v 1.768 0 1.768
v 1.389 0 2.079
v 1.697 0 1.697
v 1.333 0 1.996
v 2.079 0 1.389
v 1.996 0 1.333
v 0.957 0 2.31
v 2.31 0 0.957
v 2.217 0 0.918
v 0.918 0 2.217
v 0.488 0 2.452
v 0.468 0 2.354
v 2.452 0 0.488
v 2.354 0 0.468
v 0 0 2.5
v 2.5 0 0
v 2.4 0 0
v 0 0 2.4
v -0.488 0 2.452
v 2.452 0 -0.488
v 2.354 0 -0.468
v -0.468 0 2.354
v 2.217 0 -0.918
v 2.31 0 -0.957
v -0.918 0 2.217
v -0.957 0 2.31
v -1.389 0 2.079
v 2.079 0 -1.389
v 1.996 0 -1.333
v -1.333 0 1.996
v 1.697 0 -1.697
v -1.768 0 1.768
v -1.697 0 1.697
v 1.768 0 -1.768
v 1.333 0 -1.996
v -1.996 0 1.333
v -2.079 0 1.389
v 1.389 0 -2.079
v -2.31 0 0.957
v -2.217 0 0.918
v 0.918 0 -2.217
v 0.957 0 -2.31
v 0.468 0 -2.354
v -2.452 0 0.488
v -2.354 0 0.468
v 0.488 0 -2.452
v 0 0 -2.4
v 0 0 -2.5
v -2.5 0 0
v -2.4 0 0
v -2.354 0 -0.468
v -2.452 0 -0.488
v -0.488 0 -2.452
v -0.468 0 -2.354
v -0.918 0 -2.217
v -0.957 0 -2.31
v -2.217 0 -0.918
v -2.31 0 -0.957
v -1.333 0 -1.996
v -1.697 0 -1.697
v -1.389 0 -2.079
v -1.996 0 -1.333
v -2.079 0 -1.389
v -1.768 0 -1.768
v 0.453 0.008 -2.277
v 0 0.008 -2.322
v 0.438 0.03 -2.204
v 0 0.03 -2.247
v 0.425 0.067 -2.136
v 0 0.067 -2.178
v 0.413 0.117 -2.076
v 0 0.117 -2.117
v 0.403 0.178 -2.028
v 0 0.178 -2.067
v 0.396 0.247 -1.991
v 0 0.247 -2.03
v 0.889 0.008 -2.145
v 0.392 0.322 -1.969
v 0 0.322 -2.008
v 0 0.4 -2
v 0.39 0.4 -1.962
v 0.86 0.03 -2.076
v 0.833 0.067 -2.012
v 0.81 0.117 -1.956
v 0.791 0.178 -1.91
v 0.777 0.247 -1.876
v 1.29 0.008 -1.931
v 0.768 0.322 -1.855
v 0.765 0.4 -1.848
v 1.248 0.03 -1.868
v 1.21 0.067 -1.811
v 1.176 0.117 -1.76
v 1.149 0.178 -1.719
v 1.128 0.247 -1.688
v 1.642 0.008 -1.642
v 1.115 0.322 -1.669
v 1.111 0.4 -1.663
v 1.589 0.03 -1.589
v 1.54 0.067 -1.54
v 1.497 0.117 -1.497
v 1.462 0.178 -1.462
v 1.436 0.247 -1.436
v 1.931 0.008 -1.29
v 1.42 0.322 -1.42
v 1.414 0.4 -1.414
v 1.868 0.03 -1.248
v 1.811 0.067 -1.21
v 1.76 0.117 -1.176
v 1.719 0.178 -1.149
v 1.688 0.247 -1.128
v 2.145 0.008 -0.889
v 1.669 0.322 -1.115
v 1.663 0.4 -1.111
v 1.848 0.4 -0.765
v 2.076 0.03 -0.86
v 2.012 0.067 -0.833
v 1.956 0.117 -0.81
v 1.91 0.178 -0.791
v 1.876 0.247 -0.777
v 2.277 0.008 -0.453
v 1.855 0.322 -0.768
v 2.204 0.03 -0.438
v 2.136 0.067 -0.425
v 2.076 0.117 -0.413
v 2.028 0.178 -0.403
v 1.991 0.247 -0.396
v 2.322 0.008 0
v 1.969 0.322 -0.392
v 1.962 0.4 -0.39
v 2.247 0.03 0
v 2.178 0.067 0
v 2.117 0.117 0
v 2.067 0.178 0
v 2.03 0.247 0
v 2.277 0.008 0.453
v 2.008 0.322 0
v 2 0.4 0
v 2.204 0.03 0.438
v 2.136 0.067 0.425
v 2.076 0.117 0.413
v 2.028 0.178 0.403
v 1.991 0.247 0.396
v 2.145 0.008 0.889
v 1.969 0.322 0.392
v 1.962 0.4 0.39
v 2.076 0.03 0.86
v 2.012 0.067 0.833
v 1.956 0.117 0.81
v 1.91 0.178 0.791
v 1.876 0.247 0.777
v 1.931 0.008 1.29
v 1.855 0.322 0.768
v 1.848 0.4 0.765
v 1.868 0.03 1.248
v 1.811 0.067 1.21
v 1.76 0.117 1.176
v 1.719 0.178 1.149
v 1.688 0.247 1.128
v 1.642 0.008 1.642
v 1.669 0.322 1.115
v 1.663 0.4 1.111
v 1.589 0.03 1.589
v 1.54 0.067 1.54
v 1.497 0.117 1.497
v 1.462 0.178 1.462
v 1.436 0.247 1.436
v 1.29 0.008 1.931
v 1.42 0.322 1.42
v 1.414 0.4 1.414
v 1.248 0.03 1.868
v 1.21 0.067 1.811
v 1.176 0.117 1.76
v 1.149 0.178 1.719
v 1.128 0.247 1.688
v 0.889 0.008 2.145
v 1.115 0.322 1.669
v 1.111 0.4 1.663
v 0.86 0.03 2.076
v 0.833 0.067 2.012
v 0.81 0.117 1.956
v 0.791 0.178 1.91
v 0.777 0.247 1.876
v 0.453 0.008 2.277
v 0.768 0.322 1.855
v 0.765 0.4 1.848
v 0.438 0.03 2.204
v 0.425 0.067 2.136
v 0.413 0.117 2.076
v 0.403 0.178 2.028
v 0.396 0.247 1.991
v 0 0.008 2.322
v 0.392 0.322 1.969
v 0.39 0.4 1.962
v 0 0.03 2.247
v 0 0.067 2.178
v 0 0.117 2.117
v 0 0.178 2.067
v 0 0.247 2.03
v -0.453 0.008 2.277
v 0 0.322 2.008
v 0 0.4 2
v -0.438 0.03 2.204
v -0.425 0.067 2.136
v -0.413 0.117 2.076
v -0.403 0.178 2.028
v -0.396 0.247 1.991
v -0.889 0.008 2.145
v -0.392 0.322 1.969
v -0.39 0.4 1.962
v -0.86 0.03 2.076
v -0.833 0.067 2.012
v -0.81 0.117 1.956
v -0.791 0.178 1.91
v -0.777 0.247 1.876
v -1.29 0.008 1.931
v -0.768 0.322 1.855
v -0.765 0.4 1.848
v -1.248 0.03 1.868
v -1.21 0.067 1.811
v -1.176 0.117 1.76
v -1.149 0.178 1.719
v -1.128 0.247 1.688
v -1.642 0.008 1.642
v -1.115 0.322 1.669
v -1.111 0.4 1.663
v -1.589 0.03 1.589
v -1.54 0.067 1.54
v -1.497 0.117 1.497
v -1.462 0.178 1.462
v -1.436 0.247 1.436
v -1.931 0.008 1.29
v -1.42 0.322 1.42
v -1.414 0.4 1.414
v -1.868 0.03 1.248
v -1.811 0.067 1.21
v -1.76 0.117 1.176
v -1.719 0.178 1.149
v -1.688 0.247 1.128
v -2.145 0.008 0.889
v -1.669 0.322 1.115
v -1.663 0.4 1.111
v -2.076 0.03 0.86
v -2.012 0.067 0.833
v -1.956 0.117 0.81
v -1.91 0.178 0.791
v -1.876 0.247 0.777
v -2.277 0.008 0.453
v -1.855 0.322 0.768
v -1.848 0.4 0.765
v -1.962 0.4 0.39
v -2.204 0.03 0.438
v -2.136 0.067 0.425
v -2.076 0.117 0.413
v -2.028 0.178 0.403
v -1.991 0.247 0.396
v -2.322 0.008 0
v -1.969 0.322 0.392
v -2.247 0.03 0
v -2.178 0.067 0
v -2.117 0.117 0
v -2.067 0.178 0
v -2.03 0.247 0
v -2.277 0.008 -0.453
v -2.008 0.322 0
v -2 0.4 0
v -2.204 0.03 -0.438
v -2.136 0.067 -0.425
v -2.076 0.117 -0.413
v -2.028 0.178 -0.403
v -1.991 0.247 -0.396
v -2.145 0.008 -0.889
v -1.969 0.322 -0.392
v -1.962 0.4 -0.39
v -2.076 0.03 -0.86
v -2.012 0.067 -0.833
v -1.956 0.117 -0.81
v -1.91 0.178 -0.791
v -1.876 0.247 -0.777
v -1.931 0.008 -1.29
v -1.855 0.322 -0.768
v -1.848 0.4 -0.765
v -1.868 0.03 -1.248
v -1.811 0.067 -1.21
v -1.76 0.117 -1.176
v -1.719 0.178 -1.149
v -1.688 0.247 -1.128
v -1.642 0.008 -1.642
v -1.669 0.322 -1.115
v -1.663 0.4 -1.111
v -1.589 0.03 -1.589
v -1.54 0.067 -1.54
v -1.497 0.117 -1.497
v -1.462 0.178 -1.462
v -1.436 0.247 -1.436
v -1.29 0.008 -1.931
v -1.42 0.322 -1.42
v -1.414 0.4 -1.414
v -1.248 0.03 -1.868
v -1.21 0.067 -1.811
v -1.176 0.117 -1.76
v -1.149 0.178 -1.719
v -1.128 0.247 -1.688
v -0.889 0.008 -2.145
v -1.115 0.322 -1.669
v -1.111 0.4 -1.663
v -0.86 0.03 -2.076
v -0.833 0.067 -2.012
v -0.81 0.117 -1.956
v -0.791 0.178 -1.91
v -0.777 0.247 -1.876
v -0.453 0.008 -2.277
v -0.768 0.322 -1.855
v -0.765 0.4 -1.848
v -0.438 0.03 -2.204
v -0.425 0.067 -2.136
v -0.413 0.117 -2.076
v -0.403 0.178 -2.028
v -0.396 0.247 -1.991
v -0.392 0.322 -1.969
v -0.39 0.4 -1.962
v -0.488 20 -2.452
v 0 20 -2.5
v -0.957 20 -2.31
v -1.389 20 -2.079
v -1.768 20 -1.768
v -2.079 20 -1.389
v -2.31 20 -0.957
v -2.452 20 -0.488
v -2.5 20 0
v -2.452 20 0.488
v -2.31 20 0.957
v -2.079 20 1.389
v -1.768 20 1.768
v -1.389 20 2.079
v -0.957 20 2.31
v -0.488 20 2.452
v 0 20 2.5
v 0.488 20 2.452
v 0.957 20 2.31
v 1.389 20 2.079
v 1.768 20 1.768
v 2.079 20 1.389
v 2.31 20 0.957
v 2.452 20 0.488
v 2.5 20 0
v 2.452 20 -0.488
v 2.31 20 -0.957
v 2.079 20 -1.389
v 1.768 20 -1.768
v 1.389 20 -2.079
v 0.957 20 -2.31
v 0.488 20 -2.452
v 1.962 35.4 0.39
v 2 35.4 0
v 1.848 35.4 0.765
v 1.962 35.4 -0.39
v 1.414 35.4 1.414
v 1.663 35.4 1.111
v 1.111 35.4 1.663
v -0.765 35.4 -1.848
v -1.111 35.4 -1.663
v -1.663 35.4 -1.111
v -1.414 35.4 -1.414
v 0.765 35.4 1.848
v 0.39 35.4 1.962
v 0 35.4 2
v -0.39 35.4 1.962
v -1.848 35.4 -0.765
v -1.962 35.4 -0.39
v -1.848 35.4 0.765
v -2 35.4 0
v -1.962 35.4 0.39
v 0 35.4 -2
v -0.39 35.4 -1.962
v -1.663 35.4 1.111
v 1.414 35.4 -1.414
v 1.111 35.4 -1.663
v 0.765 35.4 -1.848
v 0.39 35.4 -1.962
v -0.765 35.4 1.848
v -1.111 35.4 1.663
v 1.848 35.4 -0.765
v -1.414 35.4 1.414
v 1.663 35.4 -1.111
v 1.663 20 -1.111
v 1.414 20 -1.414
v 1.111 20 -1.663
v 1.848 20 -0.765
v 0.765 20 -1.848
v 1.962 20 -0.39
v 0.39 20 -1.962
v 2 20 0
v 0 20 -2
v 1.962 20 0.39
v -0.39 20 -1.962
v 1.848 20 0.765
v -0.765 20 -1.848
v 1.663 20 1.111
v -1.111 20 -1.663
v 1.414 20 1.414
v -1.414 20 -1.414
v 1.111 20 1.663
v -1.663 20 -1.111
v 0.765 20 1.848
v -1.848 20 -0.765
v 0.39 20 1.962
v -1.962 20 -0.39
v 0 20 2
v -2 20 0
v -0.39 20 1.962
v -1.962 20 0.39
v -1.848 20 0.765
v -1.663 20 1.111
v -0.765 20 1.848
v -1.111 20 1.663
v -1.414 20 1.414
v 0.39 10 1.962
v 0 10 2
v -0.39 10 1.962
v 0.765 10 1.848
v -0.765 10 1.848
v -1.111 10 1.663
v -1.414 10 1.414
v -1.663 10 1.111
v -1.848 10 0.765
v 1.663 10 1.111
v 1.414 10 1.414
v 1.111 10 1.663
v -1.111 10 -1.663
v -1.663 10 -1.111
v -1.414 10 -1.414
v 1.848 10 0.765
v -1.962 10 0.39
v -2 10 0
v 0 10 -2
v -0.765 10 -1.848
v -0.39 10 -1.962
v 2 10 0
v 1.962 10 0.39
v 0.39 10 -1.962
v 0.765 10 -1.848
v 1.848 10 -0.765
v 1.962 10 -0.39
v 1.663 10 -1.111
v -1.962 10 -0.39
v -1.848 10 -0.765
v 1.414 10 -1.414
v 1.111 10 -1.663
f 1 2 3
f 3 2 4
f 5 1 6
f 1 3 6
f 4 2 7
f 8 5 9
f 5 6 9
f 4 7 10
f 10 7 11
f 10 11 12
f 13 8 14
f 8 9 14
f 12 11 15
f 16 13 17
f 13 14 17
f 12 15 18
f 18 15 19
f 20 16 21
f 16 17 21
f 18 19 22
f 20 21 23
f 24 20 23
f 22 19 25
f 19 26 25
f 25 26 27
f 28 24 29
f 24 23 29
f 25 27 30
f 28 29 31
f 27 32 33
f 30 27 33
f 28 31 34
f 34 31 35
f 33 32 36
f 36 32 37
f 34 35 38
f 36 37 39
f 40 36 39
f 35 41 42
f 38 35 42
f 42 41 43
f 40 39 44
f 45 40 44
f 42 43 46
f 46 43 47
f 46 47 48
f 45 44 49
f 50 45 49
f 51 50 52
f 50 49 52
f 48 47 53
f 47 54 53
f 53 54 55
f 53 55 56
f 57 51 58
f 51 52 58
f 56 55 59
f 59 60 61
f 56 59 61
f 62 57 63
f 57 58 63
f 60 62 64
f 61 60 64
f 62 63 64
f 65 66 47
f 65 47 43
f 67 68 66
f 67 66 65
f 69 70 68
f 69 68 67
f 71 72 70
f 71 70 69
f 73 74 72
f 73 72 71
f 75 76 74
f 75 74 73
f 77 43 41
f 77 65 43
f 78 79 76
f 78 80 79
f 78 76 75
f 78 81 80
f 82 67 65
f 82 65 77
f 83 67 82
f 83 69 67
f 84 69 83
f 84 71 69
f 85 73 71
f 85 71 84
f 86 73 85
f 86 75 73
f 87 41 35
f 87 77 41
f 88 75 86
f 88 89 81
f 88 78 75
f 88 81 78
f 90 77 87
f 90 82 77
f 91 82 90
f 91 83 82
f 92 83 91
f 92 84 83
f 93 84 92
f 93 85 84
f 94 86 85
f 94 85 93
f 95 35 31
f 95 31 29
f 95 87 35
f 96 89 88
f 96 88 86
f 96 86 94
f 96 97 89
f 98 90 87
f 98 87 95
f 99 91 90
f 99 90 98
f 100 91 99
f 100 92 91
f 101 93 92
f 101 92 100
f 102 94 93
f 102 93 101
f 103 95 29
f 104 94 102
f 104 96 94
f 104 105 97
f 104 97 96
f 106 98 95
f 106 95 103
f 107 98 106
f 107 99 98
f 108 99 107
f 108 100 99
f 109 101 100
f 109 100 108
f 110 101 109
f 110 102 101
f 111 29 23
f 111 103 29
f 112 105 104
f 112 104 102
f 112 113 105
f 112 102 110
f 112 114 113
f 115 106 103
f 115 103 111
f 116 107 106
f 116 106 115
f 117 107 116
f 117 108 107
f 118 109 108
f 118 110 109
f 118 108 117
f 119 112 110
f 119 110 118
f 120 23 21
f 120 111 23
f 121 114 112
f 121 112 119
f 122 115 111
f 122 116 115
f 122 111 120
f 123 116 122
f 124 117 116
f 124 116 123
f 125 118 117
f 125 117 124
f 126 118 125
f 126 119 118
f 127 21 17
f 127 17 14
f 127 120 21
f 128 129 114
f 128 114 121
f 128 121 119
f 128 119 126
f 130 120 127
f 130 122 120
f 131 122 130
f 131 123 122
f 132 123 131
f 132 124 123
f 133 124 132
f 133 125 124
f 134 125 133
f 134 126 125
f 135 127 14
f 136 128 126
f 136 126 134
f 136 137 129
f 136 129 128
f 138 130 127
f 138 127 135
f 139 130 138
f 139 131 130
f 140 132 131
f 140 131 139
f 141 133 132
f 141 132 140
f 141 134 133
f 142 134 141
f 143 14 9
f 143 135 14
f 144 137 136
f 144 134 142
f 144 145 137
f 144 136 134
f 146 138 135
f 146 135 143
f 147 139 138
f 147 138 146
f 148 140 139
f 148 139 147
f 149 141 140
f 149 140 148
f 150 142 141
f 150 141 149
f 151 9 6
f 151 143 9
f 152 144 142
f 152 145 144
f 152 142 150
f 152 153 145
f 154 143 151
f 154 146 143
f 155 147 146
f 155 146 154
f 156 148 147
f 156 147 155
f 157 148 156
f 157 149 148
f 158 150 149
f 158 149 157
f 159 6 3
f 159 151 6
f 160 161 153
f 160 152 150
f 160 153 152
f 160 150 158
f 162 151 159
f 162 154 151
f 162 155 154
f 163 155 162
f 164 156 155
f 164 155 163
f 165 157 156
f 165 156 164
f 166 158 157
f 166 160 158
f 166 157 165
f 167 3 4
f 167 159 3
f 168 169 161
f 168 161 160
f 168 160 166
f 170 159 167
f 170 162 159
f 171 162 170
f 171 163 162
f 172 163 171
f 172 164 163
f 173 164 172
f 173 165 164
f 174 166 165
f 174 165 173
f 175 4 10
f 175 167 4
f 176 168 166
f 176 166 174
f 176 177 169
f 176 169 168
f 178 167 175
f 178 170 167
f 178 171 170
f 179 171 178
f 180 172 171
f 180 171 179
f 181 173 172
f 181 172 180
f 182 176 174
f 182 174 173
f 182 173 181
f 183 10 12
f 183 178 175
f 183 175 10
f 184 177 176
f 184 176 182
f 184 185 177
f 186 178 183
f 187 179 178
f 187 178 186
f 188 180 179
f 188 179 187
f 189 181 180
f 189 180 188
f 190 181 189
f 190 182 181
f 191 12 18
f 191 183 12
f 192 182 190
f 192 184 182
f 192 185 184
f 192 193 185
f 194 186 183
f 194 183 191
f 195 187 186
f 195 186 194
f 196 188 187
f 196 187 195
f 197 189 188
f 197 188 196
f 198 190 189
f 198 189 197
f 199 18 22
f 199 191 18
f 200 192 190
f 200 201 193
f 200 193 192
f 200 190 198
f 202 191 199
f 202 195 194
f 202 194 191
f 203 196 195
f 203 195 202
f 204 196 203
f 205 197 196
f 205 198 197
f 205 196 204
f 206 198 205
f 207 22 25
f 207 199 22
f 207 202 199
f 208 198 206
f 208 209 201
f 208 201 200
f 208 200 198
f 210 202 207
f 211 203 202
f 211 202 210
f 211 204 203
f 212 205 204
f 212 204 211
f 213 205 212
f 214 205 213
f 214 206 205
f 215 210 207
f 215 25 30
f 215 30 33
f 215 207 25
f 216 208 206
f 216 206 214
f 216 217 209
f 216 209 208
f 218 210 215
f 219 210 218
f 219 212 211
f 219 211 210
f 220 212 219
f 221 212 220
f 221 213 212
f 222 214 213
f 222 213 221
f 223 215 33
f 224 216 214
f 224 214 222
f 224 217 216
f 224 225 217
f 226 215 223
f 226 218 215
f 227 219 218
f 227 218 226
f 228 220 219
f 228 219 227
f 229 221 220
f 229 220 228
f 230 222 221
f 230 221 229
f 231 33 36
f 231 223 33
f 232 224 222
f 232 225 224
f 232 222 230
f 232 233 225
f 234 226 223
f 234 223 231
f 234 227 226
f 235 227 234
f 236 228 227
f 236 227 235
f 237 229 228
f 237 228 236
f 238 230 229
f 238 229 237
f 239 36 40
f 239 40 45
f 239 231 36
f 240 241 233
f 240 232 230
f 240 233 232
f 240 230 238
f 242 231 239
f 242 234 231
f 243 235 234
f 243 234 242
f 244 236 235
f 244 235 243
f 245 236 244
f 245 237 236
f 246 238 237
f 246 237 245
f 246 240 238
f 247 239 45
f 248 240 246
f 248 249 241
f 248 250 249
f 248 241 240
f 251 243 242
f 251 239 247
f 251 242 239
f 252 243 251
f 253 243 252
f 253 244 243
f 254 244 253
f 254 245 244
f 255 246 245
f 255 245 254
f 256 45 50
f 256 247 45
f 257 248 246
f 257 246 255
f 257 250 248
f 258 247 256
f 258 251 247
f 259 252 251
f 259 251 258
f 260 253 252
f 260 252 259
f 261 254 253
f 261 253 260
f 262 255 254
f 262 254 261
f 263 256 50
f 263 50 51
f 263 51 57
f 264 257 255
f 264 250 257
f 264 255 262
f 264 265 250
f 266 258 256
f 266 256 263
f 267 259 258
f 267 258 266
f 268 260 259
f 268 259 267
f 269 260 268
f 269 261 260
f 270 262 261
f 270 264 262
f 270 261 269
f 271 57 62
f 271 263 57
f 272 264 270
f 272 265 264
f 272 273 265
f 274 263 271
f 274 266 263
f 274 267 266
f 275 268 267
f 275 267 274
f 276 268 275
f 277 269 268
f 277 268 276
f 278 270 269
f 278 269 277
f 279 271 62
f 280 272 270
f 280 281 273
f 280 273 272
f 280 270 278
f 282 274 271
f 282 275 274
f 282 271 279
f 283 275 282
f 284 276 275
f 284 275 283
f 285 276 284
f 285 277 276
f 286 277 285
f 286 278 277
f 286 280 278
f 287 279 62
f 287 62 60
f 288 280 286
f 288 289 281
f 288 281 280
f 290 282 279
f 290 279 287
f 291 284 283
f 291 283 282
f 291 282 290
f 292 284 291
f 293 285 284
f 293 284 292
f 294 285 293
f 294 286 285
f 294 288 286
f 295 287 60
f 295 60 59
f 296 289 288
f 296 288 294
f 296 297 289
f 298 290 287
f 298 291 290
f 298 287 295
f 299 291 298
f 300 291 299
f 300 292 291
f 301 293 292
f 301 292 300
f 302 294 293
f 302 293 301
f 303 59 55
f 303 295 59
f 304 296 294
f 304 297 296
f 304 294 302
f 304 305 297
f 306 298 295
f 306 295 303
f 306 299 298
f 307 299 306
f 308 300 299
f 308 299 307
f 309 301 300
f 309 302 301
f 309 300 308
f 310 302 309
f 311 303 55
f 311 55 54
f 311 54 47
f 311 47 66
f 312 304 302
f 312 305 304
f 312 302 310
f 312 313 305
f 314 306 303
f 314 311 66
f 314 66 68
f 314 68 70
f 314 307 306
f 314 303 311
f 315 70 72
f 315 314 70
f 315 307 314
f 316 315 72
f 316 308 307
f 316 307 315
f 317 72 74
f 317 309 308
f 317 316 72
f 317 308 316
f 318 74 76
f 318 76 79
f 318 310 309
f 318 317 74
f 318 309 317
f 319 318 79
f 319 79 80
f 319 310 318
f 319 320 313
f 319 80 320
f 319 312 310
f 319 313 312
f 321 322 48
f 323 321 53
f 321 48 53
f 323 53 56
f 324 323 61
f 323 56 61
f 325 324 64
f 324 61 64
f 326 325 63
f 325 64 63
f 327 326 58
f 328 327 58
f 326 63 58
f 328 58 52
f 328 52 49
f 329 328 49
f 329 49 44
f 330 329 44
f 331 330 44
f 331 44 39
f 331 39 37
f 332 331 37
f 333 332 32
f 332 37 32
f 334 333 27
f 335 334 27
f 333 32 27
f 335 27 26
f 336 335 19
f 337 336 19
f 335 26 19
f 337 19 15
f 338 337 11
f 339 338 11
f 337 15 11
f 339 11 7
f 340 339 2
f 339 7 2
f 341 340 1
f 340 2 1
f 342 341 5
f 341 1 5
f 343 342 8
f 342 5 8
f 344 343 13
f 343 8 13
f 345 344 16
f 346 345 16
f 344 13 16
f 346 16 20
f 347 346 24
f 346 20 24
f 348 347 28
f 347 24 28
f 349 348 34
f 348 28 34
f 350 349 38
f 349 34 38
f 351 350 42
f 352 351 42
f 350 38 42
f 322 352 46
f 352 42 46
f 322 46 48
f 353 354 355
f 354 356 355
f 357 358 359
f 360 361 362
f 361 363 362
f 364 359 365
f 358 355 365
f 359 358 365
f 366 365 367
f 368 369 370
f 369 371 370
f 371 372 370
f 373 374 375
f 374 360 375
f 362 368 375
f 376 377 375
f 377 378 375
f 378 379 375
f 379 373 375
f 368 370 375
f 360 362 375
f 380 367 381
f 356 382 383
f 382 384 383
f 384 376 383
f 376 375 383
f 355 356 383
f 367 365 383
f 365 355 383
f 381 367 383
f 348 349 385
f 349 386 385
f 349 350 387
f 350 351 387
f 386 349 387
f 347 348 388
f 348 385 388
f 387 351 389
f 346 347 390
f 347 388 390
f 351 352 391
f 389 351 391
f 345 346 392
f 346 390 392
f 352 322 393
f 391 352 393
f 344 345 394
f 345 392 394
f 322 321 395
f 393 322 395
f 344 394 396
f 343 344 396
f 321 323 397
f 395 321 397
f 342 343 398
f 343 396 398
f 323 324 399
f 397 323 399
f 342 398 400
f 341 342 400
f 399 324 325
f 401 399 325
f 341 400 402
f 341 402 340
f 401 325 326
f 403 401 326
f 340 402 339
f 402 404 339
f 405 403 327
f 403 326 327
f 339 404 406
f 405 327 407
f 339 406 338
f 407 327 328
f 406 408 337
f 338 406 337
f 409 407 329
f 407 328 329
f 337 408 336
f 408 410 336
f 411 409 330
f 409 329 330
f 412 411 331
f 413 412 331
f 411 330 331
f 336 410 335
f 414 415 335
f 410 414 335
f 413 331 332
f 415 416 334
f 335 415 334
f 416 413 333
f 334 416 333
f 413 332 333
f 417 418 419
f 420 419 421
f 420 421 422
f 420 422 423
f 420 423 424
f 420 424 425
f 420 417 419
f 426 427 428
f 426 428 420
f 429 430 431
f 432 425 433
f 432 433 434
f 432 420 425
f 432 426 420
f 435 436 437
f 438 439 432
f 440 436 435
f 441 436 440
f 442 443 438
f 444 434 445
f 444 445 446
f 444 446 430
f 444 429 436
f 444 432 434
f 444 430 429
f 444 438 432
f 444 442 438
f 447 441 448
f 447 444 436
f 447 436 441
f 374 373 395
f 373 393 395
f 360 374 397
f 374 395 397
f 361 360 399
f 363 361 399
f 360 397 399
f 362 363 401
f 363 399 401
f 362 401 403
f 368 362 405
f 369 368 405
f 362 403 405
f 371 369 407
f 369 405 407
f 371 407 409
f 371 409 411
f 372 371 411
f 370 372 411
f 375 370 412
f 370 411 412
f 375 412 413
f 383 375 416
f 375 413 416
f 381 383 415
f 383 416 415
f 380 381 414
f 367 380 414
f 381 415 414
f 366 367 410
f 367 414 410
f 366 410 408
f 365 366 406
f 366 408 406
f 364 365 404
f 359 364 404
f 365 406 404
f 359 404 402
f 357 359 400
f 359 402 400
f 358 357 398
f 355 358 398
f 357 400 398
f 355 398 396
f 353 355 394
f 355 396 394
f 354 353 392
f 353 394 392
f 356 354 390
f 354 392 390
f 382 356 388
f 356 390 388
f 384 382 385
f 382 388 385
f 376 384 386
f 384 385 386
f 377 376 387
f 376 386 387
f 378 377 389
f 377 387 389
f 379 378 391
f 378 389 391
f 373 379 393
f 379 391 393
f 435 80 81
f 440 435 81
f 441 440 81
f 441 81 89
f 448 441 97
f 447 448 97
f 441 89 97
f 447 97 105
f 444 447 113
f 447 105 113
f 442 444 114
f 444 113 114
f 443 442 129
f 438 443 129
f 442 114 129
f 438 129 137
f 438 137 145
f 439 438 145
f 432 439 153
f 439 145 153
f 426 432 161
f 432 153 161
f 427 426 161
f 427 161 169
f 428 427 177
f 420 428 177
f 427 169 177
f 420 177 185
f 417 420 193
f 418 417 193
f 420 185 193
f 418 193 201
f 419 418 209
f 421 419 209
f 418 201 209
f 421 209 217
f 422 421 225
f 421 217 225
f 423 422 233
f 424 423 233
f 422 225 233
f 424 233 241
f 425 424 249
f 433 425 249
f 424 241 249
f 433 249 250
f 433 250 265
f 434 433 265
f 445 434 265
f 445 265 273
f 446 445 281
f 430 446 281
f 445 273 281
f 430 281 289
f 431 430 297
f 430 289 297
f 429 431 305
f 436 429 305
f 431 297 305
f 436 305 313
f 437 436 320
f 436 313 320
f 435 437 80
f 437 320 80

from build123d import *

# Parameters (mm, degrees)
IZIM2_R               = 2
KES_EKSTR_ZYON1_DEPTH = 10
RADYUS1_R             = 0.4


with BuildPart() as part:
    # Çizim1 → Döndür1 (revolve)
    with BuildSketch(Plane.XY, mode=Mode.PRIVATE) as d_nd_r1_sk:
        Polygon((0, 0), (0, 35.4), (2, 35.4), (2, 20), (2.5, 20), (2.5, 0), align=None)
    revolve(d_nd_r1_sk.sketch.rotate(Axis((0, 0, 0), (0, 1, 0)), 90), axis=Axis((0, 0, 0), (0, 1, 0)))

    # Çizim2 → Kes-Ekstrüzyon1 (cut)
    with BuildSketch(Plane.XZ):
        with Locations(Location((0, 0, 0), (0, 0, 270))):
            Circle(IZIM2_R)
    extrude(amount=-KES_EKSTR_ZYON1_DEPTH, mode=Mode.SUBTRACT)

    # Radyus1
    radyus1_edges = [part.edges().sort_by_distance(p)[0] for p in [
        (0, 0, 2),
    ]]
    fillet(radyus1_edges, radius=RADYUS1_R)


solid = part.part
